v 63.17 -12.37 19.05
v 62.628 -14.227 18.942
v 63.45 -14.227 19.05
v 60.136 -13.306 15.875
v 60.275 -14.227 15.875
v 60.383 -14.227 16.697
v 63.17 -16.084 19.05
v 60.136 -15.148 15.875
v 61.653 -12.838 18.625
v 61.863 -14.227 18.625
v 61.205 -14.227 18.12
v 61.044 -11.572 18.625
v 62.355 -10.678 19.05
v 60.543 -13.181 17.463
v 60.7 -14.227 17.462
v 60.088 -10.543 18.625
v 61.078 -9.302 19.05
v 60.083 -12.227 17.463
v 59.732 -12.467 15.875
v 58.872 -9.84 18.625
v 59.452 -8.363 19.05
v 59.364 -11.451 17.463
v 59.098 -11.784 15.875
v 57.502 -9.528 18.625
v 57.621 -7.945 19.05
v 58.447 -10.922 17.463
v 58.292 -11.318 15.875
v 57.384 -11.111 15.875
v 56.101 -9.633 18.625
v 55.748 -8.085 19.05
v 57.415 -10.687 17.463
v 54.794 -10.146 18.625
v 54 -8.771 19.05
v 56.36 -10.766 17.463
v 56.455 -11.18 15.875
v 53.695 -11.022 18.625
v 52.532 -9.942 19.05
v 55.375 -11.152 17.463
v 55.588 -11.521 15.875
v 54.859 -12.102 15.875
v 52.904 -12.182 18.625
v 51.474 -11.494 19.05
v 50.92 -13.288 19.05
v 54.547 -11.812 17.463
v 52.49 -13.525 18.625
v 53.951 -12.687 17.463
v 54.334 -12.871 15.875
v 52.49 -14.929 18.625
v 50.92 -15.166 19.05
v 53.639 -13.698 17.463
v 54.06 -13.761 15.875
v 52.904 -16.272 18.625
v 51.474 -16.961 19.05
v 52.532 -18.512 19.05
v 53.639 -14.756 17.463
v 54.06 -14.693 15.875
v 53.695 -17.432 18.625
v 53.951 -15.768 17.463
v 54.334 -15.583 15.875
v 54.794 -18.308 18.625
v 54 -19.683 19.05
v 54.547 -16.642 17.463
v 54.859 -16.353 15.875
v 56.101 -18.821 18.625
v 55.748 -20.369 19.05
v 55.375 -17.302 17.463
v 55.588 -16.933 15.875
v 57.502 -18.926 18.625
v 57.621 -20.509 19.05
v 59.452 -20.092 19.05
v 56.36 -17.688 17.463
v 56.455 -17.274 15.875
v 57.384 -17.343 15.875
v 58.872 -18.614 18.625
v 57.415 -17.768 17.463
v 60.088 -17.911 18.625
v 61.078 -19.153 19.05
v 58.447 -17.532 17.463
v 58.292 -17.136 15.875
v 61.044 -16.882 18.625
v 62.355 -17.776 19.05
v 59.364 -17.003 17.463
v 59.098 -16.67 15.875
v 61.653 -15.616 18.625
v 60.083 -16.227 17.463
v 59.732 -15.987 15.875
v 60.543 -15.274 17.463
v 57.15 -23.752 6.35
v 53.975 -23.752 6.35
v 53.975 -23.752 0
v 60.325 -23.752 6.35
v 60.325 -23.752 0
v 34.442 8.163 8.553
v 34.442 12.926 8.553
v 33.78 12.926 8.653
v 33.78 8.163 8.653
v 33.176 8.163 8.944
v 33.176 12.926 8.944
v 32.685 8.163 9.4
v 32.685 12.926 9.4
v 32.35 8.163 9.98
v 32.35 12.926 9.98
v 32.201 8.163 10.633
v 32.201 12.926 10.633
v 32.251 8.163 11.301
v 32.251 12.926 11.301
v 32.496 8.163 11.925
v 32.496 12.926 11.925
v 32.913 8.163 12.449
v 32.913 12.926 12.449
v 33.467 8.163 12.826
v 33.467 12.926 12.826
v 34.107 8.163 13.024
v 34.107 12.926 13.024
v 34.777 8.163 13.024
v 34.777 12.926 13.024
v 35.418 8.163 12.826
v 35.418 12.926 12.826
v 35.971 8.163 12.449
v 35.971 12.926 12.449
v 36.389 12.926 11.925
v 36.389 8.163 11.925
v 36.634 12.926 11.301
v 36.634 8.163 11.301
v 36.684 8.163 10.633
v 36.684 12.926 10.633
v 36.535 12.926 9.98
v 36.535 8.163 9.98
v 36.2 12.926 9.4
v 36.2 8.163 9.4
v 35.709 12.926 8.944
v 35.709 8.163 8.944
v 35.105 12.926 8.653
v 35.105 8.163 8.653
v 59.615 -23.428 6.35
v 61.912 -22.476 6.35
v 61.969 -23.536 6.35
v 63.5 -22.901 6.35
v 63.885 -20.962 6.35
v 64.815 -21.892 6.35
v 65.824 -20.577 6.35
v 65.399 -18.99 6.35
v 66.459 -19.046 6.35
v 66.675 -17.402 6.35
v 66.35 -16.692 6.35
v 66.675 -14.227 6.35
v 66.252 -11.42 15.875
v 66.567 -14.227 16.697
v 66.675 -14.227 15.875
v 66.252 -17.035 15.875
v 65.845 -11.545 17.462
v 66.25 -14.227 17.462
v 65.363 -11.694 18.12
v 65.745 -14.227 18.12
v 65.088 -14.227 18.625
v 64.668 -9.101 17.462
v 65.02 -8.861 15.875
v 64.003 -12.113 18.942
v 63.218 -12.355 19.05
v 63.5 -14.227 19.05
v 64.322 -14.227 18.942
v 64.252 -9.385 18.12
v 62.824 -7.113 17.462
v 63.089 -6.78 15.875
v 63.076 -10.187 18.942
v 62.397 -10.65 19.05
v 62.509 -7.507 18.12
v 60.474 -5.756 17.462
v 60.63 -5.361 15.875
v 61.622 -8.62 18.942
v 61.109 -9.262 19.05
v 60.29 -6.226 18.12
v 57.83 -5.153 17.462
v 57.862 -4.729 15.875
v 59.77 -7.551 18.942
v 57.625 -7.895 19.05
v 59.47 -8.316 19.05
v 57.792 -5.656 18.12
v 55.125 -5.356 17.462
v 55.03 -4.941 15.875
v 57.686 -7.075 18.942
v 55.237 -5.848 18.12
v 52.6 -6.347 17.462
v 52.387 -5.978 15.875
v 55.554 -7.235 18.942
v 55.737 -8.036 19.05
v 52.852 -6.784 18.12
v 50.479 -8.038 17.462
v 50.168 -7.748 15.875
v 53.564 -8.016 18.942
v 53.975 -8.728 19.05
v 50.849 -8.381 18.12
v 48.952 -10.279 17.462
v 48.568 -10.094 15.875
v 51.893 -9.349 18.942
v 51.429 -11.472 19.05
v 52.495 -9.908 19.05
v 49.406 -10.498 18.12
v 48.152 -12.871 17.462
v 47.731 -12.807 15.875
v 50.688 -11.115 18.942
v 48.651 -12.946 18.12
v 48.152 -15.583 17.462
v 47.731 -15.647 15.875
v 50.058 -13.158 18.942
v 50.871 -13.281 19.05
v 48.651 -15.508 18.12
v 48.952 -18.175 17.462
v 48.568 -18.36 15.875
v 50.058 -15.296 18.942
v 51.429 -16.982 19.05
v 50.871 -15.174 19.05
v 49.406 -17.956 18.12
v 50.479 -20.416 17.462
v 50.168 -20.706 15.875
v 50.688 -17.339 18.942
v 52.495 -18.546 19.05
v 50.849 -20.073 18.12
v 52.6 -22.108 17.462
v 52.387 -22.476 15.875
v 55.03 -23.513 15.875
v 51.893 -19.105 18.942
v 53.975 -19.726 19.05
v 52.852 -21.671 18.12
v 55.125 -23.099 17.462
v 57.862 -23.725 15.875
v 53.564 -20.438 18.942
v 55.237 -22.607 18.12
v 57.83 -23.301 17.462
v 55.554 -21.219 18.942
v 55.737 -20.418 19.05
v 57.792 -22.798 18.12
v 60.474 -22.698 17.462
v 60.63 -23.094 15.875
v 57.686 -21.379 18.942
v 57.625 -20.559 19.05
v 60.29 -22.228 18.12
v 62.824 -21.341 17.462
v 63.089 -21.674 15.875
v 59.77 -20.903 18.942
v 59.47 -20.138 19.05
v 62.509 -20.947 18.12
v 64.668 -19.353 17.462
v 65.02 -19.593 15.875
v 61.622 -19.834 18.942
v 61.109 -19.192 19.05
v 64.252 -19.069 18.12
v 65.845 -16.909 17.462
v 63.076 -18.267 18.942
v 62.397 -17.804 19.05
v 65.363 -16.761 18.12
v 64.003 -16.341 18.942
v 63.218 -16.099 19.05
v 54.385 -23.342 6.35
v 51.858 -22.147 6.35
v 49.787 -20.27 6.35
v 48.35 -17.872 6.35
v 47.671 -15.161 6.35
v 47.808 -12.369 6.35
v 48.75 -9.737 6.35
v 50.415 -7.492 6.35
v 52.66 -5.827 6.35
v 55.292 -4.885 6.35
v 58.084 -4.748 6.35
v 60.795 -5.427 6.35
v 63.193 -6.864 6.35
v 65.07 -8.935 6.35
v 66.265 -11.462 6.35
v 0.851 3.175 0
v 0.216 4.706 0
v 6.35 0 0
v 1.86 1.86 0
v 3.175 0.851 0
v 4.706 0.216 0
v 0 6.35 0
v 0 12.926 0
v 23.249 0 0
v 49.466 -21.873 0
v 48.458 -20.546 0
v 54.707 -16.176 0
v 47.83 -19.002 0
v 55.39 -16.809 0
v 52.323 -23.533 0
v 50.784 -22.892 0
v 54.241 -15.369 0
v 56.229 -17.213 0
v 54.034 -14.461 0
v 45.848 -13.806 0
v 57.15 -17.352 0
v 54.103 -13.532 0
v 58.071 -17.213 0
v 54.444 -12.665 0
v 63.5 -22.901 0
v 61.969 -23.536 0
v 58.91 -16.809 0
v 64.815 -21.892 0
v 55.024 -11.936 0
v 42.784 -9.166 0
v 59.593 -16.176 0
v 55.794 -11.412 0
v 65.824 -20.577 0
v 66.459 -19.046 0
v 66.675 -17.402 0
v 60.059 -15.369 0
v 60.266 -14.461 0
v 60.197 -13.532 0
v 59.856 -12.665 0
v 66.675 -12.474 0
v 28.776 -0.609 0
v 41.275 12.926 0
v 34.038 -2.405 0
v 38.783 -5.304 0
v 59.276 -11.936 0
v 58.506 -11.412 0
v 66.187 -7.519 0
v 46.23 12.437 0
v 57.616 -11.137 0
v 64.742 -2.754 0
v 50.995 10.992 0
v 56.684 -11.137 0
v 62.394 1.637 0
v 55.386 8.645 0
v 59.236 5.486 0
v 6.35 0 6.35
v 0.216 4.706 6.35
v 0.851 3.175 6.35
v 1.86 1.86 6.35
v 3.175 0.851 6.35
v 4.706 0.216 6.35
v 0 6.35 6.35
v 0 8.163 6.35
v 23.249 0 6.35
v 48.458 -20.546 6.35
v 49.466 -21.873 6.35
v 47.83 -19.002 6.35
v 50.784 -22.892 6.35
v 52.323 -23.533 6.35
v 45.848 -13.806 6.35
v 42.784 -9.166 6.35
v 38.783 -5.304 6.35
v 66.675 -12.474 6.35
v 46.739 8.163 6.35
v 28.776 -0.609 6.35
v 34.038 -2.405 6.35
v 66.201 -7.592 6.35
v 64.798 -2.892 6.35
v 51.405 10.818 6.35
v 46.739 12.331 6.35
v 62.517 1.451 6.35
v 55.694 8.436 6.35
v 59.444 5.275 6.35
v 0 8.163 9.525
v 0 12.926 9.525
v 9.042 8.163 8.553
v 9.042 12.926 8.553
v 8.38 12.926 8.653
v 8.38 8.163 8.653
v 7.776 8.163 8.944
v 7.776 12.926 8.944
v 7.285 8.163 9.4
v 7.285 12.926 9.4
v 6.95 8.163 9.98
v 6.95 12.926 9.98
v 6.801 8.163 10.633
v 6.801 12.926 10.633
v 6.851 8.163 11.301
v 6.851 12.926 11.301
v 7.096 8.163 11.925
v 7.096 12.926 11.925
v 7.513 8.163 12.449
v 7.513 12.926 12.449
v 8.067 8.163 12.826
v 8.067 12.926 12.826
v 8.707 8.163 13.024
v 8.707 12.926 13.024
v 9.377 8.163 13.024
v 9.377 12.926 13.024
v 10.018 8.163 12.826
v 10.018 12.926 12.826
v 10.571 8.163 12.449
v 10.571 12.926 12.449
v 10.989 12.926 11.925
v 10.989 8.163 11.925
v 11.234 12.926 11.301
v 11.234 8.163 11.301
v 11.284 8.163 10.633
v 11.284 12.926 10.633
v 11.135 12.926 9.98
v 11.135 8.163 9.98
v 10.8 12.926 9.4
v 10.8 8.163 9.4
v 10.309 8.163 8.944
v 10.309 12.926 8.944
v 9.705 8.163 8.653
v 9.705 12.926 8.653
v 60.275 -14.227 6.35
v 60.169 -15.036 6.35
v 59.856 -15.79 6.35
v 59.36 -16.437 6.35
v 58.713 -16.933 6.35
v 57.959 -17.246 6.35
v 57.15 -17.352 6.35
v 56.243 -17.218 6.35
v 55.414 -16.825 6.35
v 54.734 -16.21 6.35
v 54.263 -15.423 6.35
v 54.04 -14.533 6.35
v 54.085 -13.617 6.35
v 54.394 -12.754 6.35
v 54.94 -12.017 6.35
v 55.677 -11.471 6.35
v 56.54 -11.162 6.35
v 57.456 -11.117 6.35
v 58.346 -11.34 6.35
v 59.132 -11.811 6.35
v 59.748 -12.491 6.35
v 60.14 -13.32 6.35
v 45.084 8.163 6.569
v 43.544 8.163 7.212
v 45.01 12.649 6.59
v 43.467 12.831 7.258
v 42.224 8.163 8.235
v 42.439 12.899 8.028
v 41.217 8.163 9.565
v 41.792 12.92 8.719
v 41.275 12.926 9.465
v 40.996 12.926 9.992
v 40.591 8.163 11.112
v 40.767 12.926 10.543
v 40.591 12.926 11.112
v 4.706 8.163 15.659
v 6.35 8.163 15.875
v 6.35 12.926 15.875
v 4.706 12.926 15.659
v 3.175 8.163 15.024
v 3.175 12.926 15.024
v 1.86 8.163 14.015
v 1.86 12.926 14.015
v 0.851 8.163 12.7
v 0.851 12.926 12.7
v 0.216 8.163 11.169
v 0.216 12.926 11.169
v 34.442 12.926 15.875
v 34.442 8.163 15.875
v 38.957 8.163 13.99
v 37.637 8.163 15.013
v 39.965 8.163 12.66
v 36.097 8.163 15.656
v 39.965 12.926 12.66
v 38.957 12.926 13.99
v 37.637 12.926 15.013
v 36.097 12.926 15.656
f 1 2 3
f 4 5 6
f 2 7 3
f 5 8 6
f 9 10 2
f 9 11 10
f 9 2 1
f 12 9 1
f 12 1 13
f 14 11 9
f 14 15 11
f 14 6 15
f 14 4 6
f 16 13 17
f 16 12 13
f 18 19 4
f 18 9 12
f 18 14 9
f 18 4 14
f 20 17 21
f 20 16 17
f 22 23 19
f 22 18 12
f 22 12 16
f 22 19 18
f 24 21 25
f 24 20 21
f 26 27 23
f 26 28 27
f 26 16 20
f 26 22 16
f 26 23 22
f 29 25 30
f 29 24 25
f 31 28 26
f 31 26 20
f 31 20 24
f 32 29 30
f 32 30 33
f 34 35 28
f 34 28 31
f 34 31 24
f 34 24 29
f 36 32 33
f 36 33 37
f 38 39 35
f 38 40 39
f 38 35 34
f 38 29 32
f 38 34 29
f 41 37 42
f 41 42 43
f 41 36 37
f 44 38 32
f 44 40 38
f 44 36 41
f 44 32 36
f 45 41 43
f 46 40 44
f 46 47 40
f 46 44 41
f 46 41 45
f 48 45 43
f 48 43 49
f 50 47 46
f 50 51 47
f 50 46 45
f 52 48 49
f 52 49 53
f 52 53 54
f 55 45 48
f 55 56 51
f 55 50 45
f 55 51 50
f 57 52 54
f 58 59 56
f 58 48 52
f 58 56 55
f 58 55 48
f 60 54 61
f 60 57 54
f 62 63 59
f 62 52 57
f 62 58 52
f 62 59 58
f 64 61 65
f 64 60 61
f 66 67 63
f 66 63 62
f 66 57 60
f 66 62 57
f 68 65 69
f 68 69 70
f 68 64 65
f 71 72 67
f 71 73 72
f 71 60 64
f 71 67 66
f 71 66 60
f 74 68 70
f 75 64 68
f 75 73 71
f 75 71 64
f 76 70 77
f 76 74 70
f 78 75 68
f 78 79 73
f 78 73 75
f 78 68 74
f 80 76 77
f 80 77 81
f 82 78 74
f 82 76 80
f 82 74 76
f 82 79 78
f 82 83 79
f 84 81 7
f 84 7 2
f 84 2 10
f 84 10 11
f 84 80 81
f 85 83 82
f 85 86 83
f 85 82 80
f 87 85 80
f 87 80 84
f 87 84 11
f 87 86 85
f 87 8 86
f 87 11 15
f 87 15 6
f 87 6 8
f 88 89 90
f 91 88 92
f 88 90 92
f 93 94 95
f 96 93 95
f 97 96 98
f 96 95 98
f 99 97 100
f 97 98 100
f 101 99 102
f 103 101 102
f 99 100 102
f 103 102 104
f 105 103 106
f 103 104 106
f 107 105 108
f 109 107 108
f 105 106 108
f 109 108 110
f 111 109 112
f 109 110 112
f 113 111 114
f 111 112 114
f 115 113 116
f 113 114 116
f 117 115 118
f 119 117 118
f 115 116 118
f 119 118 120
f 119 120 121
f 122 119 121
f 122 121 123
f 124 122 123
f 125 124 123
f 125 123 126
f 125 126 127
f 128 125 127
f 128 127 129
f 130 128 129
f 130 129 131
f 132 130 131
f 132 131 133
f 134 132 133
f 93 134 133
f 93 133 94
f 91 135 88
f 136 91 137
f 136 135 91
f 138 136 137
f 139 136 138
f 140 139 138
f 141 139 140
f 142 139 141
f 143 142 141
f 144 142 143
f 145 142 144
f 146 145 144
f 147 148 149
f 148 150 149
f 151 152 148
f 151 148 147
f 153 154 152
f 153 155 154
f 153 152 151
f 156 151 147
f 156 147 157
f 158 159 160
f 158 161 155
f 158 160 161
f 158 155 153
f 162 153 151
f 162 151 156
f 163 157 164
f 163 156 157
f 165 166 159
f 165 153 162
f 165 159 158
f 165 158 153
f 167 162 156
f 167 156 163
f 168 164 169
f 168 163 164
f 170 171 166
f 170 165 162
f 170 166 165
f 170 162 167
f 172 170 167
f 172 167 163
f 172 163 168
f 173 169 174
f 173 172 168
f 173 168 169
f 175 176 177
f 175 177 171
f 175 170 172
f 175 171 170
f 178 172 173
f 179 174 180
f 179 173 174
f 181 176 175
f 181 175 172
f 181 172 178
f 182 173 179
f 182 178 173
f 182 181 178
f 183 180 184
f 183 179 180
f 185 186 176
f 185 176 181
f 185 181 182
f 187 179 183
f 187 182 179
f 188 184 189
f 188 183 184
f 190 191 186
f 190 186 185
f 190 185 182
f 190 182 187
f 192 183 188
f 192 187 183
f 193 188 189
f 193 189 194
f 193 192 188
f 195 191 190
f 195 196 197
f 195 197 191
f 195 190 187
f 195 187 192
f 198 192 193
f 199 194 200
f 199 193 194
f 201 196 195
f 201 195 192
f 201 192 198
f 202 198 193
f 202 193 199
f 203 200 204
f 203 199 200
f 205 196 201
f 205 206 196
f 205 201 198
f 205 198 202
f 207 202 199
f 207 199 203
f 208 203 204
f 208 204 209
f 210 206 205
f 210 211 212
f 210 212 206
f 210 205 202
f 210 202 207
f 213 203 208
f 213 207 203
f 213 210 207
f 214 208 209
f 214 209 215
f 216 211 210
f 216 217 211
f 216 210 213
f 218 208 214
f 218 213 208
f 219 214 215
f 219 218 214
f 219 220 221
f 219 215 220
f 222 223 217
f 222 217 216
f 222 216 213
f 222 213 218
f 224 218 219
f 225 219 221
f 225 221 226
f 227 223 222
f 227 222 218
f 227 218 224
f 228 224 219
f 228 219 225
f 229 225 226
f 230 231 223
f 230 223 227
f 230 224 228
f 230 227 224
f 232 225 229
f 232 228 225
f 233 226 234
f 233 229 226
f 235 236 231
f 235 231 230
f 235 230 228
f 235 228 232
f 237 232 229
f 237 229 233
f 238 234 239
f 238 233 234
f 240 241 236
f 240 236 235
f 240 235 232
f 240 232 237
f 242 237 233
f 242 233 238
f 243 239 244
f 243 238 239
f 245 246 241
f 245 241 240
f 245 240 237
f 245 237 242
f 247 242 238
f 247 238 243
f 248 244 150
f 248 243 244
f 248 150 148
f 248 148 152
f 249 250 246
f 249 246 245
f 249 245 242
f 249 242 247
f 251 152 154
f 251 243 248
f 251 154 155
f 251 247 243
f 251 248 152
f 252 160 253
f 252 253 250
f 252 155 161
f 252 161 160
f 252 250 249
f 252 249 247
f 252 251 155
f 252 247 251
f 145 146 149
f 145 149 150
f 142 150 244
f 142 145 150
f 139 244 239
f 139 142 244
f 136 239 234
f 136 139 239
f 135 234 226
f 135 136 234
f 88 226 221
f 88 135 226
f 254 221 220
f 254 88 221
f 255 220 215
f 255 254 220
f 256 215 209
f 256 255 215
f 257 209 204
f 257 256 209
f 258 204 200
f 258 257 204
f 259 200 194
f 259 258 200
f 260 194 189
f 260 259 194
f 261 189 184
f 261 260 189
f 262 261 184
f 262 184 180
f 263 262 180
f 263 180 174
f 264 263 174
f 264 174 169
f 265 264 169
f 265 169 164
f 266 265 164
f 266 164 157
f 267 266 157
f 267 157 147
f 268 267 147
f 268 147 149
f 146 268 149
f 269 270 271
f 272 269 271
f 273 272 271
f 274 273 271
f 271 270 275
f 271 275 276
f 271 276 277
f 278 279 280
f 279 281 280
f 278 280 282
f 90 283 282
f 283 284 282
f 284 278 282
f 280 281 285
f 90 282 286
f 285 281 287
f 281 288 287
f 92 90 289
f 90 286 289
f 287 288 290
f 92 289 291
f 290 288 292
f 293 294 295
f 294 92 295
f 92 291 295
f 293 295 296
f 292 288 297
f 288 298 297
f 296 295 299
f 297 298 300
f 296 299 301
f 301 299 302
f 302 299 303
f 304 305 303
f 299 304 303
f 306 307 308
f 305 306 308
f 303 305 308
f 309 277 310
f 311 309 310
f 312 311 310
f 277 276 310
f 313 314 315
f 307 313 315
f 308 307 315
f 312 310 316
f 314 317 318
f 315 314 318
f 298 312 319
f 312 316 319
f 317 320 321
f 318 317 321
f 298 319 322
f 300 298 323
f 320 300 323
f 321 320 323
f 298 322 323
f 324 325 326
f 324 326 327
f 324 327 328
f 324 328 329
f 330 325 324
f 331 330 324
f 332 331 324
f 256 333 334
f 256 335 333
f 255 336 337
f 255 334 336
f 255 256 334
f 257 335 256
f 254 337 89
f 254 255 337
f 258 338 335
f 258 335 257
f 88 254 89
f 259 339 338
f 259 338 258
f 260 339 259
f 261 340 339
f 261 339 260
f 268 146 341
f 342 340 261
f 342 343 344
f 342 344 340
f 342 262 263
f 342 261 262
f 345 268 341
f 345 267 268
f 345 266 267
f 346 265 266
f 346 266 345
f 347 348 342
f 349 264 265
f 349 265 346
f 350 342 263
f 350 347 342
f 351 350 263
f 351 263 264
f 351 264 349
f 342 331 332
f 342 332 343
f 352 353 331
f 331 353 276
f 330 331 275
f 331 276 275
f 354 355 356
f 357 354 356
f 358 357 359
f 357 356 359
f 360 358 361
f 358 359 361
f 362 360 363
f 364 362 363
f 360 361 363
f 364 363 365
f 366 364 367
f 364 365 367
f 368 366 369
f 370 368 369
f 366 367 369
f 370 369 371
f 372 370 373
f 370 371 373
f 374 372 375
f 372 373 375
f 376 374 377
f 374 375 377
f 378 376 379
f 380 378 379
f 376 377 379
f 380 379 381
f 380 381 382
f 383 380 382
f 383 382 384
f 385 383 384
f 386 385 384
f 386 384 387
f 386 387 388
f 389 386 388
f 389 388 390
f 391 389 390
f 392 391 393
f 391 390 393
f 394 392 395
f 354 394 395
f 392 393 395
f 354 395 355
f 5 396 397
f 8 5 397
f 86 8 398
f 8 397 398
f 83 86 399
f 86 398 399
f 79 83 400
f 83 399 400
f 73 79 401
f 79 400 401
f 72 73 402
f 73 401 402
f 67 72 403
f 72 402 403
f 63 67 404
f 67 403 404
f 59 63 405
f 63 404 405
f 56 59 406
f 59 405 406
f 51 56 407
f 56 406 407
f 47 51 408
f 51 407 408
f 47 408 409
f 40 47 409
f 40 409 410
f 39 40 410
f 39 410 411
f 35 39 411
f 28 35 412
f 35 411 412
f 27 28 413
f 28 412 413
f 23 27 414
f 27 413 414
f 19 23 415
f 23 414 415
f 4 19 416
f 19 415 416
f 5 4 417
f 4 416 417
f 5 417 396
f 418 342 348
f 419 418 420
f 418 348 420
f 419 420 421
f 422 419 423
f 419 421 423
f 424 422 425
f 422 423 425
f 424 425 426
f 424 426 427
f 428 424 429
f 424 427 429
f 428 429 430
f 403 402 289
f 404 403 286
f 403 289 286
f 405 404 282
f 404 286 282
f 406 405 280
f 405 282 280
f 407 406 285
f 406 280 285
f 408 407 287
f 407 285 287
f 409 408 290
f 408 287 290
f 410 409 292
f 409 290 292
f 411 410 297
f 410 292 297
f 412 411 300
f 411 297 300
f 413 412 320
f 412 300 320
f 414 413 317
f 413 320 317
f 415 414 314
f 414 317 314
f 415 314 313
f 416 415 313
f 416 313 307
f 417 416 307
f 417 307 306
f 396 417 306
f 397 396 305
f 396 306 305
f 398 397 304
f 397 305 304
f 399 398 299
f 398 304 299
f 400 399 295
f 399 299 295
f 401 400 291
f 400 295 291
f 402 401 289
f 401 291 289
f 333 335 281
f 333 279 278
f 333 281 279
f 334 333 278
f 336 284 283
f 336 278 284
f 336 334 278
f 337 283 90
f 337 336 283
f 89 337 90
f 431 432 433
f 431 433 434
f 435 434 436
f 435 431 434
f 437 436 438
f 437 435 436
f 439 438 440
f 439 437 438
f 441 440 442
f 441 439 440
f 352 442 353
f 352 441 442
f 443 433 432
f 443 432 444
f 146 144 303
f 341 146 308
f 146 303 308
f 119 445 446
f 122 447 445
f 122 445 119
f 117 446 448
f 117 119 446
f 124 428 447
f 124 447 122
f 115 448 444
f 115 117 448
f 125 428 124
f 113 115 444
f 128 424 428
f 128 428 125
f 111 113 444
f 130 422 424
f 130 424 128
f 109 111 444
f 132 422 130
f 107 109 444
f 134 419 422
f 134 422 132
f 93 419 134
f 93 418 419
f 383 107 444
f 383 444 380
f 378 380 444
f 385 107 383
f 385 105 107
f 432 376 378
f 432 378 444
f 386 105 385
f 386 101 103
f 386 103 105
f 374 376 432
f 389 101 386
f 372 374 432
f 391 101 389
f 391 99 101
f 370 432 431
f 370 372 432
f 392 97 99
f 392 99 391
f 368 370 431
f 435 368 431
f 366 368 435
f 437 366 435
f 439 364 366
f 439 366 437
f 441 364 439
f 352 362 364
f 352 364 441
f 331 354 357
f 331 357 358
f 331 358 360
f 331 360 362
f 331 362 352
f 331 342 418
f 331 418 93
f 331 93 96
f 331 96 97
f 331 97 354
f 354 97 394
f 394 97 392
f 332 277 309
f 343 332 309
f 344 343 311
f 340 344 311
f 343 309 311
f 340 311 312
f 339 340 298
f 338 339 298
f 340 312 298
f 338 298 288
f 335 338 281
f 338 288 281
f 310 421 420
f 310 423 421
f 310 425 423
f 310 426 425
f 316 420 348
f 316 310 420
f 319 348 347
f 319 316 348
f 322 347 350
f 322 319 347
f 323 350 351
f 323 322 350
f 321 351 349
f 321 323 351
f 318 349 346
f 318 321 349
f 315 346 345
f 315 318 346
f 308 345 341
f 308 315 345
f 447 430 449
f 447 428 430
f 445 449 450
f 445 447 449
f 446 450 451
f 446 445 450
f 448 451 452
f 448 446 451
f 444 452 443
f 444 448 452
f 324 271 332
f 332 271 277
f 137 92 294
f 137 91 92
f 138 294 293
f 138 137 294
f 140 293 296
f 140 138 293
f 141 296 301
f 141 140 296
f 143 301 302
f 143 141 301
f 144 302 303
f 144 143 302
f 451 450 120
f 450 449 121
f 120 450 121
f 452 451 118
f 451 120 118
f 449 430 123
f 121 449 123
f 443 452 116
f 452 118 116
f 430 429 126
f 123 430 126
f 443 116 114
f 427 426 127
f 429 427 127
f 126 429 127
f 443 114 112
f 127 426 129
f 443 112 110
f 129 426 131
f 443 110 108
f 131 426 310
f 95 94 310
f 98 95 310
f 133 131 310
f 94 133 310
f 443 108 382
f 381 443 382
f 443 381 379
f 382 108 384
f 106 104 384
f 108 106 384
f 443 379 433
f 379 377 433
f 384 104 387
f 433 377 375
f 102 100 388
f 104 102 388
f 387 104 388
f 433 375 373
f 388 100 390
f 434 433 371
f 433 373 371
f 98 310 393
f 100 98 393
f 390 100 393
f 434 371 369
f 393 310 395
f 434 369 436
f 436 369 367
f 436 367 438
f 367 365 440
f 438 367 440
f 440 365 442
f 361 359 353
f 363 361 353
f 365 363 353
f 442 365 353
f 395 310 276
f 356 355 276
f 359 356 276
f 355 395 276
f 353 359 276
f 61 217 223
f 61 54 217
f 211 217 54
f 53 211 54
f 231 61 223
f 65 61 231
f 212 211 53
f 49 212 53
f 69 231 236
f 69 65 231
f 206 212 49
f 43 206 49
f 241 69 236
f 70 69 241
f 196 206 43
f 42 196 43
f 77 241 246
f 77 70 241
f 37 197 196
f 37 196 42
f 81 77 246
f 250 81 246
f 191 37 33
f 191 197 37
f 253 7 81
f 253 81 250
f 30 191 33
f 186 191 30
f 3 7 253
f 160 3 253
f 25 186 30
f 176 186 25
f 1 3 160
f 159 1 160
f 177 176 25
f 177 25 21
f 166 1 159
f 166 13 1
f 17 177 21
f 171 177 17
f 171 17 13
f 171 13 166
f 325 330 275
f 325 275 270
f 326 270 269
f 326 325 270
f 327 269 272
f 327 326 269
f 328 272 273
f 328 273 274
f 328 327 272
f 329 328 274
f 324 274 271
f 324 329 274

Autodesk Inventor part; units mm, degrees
ref_plane "YZ Plane" through (0, 0, 0) normal (1, 0, 0) x (0, 1, 0)
ref_plane "XZ Plane" through (0, 0, 0) normal (0, 1, 0) x (-1, 0, 0)
sketch "Sketch1" plane through (0, 0, 0) normal (0, 0, 1) x (1, 0, 0)
  line L0 (0, 0) -> (66.675, 0)
  line L1 (66.675, 0) -> (66.675, 12.9255)
  line L2 (66.675, 12.9255) -> (0, 12.9255)
  line L3 (0, 12.9255) -> (0, 0)
  line L4 (66.675, 12.9255) -> (47.625, 12.9255)
  line L5 (47.625, 12.9255) -> (47.625, -23.7521)
  line L6 (47.625, -23.7521) -> (66.675, -23.7521)
  line L7 (66.675, -23.7521) -> (66.675, 12.9255)
  point P0 (57.15, -14.2271)
  point P1 (34.4424, 12.9255)
  point P2 (9.0424, 12.9255)
  dimension "d0" = 66.675
  dimension "d3" = 25.4
  dimension "d4" = 27.1526
  dimension "d5" = 0
  dimension "d41" = 48.1076
  dimension "d42" = 19.05
  dimension "d43" = 9.525
extrude "Extrusion1" add sketch "Sketch1" along normal blind 6.35
sketch "Sketch2" plane through (0, 0, 6.35) normal (0, 0, 1) x (1, 0, 0)
  line L0 (66.675, -23.7521) -> (66.675, 12.9255) projected
  line L1 (47.625, 0) -> (47.625, -23.7521) projected
  line L2 (66.675, 12.9255) -> (0, 12.9255) projected
  line L3 (47.625, -23.7521) -> (66.675, -23.7521) projected
  point P0 (0, 0)
  point P1 (57.15, -14.2271)
  dimension "d12" = 27.1526
  dimension "d44" = 9.525
  dimension "d45" = 9.525
  dimension "d46" = 9.525
hole "Hole1" at (57.15, -14.2271, 6.35) direction (0, 0, -1) diameter 6.25 depth 25.4 tip angle 118
sketch "Sketch3" plane through (0, 0, 6.35) normal (0, 0, 1) x (1, 0, 0)
  circle A0 centre (57.15, -14.2271) radius 3.125 projected
  circle A1 centre (57.15, -14.2271) radius 9.525
  line L0 (47.625, -23.7521) -> (66.675, -23.7521) projected
  point P0 (0, 0)
extrude "Extrusion2" add sketch "Sketch3" along normal blind 12.7
fillet "Fillet1" radius 6.35 2 edges at (66.675, -23.7521, 3.175) (47.625, -23.7521, 3.175)
fillet "Fillet2" radius 25.4 2 edges at (47.625, 0, 3.175) (66.675, 12.9255, 3.175)
sketch "Sketch4" plane through (0, 0, 6.35) normal (0, 0, 1) x (1, 0, 0)
  line L0 (0, 12.9255) -> (0, 0) projected
  line L1 (0, 12.9255) -> (40.7924, 12.9255)
  line L2 (40.7924, 12.9255) -> (40.7924, 8.163)
  line L3 (40.7924, 8.163) -> (0, 8.163)
  line L4 (0, 8.163) -> (0, 12.9255)
  circle A0 centre (57.15, -14.2271) radius 3.125 projected
  dimension "d24" = 16.3576
  dimension "d25" = 4.7625
extrude "Extrusion3" add sketch "Sketch4" along normal blind 9.525 contours L1 L2 L3 L0
fillet "Fillet3" radius 6.35 2 edges at (40.7924, 10.5443, 15.875) (0, 10.5443, 15.875)
fillet "Fillet4" radius 6.35 1 edges at (40.7924, 10.5443, 6.35)
sketch "Sketch5" plane through (6.35, 8.163, 15.875) normal (0, -1, 0) x (1, 0, 0)
  line L0 (47.675, 3.175) -> (53.925, 3.175) projected
  point P0 (-6.35, -15.875)
  point P1 (2.6924, -5.0739)
  point P2 (28.0924, -5.0739)
  point P3 (50.8, 3.175)
  dimension "d30" = 25.4
  dimension "d31" = 22.7076
hole "Hole2" at (9.0424, 8.163, 10.8011) at (34.4424, 8.163, 10.8011) at (57.15, 8.163, 19.05) direction (0, 1, 0) diameter 4.4958 depth 25.4 tip angle 118 clearance for "Flat Head Machine Screw (82)" size "#8" standard "Ansi Unified Screw Threads"
fillet "Fillet5" radius 6.35 1 edges at (0, 0, 3.175)
fillet "Fillet6" radius 3.175 1 edges at (47.625, -14.2271, 19.05)
fillet "Fillet7" radius 3.175 1 edges at (54.025, -14.2271, 19.05)
ref_plane "Work Plane1" through (-0.254, 8.163, 9.525) normal (-1, 0, 0) x (0, 0, 1)
equation "\"d44\" = d45"
properties part number "supporty"
